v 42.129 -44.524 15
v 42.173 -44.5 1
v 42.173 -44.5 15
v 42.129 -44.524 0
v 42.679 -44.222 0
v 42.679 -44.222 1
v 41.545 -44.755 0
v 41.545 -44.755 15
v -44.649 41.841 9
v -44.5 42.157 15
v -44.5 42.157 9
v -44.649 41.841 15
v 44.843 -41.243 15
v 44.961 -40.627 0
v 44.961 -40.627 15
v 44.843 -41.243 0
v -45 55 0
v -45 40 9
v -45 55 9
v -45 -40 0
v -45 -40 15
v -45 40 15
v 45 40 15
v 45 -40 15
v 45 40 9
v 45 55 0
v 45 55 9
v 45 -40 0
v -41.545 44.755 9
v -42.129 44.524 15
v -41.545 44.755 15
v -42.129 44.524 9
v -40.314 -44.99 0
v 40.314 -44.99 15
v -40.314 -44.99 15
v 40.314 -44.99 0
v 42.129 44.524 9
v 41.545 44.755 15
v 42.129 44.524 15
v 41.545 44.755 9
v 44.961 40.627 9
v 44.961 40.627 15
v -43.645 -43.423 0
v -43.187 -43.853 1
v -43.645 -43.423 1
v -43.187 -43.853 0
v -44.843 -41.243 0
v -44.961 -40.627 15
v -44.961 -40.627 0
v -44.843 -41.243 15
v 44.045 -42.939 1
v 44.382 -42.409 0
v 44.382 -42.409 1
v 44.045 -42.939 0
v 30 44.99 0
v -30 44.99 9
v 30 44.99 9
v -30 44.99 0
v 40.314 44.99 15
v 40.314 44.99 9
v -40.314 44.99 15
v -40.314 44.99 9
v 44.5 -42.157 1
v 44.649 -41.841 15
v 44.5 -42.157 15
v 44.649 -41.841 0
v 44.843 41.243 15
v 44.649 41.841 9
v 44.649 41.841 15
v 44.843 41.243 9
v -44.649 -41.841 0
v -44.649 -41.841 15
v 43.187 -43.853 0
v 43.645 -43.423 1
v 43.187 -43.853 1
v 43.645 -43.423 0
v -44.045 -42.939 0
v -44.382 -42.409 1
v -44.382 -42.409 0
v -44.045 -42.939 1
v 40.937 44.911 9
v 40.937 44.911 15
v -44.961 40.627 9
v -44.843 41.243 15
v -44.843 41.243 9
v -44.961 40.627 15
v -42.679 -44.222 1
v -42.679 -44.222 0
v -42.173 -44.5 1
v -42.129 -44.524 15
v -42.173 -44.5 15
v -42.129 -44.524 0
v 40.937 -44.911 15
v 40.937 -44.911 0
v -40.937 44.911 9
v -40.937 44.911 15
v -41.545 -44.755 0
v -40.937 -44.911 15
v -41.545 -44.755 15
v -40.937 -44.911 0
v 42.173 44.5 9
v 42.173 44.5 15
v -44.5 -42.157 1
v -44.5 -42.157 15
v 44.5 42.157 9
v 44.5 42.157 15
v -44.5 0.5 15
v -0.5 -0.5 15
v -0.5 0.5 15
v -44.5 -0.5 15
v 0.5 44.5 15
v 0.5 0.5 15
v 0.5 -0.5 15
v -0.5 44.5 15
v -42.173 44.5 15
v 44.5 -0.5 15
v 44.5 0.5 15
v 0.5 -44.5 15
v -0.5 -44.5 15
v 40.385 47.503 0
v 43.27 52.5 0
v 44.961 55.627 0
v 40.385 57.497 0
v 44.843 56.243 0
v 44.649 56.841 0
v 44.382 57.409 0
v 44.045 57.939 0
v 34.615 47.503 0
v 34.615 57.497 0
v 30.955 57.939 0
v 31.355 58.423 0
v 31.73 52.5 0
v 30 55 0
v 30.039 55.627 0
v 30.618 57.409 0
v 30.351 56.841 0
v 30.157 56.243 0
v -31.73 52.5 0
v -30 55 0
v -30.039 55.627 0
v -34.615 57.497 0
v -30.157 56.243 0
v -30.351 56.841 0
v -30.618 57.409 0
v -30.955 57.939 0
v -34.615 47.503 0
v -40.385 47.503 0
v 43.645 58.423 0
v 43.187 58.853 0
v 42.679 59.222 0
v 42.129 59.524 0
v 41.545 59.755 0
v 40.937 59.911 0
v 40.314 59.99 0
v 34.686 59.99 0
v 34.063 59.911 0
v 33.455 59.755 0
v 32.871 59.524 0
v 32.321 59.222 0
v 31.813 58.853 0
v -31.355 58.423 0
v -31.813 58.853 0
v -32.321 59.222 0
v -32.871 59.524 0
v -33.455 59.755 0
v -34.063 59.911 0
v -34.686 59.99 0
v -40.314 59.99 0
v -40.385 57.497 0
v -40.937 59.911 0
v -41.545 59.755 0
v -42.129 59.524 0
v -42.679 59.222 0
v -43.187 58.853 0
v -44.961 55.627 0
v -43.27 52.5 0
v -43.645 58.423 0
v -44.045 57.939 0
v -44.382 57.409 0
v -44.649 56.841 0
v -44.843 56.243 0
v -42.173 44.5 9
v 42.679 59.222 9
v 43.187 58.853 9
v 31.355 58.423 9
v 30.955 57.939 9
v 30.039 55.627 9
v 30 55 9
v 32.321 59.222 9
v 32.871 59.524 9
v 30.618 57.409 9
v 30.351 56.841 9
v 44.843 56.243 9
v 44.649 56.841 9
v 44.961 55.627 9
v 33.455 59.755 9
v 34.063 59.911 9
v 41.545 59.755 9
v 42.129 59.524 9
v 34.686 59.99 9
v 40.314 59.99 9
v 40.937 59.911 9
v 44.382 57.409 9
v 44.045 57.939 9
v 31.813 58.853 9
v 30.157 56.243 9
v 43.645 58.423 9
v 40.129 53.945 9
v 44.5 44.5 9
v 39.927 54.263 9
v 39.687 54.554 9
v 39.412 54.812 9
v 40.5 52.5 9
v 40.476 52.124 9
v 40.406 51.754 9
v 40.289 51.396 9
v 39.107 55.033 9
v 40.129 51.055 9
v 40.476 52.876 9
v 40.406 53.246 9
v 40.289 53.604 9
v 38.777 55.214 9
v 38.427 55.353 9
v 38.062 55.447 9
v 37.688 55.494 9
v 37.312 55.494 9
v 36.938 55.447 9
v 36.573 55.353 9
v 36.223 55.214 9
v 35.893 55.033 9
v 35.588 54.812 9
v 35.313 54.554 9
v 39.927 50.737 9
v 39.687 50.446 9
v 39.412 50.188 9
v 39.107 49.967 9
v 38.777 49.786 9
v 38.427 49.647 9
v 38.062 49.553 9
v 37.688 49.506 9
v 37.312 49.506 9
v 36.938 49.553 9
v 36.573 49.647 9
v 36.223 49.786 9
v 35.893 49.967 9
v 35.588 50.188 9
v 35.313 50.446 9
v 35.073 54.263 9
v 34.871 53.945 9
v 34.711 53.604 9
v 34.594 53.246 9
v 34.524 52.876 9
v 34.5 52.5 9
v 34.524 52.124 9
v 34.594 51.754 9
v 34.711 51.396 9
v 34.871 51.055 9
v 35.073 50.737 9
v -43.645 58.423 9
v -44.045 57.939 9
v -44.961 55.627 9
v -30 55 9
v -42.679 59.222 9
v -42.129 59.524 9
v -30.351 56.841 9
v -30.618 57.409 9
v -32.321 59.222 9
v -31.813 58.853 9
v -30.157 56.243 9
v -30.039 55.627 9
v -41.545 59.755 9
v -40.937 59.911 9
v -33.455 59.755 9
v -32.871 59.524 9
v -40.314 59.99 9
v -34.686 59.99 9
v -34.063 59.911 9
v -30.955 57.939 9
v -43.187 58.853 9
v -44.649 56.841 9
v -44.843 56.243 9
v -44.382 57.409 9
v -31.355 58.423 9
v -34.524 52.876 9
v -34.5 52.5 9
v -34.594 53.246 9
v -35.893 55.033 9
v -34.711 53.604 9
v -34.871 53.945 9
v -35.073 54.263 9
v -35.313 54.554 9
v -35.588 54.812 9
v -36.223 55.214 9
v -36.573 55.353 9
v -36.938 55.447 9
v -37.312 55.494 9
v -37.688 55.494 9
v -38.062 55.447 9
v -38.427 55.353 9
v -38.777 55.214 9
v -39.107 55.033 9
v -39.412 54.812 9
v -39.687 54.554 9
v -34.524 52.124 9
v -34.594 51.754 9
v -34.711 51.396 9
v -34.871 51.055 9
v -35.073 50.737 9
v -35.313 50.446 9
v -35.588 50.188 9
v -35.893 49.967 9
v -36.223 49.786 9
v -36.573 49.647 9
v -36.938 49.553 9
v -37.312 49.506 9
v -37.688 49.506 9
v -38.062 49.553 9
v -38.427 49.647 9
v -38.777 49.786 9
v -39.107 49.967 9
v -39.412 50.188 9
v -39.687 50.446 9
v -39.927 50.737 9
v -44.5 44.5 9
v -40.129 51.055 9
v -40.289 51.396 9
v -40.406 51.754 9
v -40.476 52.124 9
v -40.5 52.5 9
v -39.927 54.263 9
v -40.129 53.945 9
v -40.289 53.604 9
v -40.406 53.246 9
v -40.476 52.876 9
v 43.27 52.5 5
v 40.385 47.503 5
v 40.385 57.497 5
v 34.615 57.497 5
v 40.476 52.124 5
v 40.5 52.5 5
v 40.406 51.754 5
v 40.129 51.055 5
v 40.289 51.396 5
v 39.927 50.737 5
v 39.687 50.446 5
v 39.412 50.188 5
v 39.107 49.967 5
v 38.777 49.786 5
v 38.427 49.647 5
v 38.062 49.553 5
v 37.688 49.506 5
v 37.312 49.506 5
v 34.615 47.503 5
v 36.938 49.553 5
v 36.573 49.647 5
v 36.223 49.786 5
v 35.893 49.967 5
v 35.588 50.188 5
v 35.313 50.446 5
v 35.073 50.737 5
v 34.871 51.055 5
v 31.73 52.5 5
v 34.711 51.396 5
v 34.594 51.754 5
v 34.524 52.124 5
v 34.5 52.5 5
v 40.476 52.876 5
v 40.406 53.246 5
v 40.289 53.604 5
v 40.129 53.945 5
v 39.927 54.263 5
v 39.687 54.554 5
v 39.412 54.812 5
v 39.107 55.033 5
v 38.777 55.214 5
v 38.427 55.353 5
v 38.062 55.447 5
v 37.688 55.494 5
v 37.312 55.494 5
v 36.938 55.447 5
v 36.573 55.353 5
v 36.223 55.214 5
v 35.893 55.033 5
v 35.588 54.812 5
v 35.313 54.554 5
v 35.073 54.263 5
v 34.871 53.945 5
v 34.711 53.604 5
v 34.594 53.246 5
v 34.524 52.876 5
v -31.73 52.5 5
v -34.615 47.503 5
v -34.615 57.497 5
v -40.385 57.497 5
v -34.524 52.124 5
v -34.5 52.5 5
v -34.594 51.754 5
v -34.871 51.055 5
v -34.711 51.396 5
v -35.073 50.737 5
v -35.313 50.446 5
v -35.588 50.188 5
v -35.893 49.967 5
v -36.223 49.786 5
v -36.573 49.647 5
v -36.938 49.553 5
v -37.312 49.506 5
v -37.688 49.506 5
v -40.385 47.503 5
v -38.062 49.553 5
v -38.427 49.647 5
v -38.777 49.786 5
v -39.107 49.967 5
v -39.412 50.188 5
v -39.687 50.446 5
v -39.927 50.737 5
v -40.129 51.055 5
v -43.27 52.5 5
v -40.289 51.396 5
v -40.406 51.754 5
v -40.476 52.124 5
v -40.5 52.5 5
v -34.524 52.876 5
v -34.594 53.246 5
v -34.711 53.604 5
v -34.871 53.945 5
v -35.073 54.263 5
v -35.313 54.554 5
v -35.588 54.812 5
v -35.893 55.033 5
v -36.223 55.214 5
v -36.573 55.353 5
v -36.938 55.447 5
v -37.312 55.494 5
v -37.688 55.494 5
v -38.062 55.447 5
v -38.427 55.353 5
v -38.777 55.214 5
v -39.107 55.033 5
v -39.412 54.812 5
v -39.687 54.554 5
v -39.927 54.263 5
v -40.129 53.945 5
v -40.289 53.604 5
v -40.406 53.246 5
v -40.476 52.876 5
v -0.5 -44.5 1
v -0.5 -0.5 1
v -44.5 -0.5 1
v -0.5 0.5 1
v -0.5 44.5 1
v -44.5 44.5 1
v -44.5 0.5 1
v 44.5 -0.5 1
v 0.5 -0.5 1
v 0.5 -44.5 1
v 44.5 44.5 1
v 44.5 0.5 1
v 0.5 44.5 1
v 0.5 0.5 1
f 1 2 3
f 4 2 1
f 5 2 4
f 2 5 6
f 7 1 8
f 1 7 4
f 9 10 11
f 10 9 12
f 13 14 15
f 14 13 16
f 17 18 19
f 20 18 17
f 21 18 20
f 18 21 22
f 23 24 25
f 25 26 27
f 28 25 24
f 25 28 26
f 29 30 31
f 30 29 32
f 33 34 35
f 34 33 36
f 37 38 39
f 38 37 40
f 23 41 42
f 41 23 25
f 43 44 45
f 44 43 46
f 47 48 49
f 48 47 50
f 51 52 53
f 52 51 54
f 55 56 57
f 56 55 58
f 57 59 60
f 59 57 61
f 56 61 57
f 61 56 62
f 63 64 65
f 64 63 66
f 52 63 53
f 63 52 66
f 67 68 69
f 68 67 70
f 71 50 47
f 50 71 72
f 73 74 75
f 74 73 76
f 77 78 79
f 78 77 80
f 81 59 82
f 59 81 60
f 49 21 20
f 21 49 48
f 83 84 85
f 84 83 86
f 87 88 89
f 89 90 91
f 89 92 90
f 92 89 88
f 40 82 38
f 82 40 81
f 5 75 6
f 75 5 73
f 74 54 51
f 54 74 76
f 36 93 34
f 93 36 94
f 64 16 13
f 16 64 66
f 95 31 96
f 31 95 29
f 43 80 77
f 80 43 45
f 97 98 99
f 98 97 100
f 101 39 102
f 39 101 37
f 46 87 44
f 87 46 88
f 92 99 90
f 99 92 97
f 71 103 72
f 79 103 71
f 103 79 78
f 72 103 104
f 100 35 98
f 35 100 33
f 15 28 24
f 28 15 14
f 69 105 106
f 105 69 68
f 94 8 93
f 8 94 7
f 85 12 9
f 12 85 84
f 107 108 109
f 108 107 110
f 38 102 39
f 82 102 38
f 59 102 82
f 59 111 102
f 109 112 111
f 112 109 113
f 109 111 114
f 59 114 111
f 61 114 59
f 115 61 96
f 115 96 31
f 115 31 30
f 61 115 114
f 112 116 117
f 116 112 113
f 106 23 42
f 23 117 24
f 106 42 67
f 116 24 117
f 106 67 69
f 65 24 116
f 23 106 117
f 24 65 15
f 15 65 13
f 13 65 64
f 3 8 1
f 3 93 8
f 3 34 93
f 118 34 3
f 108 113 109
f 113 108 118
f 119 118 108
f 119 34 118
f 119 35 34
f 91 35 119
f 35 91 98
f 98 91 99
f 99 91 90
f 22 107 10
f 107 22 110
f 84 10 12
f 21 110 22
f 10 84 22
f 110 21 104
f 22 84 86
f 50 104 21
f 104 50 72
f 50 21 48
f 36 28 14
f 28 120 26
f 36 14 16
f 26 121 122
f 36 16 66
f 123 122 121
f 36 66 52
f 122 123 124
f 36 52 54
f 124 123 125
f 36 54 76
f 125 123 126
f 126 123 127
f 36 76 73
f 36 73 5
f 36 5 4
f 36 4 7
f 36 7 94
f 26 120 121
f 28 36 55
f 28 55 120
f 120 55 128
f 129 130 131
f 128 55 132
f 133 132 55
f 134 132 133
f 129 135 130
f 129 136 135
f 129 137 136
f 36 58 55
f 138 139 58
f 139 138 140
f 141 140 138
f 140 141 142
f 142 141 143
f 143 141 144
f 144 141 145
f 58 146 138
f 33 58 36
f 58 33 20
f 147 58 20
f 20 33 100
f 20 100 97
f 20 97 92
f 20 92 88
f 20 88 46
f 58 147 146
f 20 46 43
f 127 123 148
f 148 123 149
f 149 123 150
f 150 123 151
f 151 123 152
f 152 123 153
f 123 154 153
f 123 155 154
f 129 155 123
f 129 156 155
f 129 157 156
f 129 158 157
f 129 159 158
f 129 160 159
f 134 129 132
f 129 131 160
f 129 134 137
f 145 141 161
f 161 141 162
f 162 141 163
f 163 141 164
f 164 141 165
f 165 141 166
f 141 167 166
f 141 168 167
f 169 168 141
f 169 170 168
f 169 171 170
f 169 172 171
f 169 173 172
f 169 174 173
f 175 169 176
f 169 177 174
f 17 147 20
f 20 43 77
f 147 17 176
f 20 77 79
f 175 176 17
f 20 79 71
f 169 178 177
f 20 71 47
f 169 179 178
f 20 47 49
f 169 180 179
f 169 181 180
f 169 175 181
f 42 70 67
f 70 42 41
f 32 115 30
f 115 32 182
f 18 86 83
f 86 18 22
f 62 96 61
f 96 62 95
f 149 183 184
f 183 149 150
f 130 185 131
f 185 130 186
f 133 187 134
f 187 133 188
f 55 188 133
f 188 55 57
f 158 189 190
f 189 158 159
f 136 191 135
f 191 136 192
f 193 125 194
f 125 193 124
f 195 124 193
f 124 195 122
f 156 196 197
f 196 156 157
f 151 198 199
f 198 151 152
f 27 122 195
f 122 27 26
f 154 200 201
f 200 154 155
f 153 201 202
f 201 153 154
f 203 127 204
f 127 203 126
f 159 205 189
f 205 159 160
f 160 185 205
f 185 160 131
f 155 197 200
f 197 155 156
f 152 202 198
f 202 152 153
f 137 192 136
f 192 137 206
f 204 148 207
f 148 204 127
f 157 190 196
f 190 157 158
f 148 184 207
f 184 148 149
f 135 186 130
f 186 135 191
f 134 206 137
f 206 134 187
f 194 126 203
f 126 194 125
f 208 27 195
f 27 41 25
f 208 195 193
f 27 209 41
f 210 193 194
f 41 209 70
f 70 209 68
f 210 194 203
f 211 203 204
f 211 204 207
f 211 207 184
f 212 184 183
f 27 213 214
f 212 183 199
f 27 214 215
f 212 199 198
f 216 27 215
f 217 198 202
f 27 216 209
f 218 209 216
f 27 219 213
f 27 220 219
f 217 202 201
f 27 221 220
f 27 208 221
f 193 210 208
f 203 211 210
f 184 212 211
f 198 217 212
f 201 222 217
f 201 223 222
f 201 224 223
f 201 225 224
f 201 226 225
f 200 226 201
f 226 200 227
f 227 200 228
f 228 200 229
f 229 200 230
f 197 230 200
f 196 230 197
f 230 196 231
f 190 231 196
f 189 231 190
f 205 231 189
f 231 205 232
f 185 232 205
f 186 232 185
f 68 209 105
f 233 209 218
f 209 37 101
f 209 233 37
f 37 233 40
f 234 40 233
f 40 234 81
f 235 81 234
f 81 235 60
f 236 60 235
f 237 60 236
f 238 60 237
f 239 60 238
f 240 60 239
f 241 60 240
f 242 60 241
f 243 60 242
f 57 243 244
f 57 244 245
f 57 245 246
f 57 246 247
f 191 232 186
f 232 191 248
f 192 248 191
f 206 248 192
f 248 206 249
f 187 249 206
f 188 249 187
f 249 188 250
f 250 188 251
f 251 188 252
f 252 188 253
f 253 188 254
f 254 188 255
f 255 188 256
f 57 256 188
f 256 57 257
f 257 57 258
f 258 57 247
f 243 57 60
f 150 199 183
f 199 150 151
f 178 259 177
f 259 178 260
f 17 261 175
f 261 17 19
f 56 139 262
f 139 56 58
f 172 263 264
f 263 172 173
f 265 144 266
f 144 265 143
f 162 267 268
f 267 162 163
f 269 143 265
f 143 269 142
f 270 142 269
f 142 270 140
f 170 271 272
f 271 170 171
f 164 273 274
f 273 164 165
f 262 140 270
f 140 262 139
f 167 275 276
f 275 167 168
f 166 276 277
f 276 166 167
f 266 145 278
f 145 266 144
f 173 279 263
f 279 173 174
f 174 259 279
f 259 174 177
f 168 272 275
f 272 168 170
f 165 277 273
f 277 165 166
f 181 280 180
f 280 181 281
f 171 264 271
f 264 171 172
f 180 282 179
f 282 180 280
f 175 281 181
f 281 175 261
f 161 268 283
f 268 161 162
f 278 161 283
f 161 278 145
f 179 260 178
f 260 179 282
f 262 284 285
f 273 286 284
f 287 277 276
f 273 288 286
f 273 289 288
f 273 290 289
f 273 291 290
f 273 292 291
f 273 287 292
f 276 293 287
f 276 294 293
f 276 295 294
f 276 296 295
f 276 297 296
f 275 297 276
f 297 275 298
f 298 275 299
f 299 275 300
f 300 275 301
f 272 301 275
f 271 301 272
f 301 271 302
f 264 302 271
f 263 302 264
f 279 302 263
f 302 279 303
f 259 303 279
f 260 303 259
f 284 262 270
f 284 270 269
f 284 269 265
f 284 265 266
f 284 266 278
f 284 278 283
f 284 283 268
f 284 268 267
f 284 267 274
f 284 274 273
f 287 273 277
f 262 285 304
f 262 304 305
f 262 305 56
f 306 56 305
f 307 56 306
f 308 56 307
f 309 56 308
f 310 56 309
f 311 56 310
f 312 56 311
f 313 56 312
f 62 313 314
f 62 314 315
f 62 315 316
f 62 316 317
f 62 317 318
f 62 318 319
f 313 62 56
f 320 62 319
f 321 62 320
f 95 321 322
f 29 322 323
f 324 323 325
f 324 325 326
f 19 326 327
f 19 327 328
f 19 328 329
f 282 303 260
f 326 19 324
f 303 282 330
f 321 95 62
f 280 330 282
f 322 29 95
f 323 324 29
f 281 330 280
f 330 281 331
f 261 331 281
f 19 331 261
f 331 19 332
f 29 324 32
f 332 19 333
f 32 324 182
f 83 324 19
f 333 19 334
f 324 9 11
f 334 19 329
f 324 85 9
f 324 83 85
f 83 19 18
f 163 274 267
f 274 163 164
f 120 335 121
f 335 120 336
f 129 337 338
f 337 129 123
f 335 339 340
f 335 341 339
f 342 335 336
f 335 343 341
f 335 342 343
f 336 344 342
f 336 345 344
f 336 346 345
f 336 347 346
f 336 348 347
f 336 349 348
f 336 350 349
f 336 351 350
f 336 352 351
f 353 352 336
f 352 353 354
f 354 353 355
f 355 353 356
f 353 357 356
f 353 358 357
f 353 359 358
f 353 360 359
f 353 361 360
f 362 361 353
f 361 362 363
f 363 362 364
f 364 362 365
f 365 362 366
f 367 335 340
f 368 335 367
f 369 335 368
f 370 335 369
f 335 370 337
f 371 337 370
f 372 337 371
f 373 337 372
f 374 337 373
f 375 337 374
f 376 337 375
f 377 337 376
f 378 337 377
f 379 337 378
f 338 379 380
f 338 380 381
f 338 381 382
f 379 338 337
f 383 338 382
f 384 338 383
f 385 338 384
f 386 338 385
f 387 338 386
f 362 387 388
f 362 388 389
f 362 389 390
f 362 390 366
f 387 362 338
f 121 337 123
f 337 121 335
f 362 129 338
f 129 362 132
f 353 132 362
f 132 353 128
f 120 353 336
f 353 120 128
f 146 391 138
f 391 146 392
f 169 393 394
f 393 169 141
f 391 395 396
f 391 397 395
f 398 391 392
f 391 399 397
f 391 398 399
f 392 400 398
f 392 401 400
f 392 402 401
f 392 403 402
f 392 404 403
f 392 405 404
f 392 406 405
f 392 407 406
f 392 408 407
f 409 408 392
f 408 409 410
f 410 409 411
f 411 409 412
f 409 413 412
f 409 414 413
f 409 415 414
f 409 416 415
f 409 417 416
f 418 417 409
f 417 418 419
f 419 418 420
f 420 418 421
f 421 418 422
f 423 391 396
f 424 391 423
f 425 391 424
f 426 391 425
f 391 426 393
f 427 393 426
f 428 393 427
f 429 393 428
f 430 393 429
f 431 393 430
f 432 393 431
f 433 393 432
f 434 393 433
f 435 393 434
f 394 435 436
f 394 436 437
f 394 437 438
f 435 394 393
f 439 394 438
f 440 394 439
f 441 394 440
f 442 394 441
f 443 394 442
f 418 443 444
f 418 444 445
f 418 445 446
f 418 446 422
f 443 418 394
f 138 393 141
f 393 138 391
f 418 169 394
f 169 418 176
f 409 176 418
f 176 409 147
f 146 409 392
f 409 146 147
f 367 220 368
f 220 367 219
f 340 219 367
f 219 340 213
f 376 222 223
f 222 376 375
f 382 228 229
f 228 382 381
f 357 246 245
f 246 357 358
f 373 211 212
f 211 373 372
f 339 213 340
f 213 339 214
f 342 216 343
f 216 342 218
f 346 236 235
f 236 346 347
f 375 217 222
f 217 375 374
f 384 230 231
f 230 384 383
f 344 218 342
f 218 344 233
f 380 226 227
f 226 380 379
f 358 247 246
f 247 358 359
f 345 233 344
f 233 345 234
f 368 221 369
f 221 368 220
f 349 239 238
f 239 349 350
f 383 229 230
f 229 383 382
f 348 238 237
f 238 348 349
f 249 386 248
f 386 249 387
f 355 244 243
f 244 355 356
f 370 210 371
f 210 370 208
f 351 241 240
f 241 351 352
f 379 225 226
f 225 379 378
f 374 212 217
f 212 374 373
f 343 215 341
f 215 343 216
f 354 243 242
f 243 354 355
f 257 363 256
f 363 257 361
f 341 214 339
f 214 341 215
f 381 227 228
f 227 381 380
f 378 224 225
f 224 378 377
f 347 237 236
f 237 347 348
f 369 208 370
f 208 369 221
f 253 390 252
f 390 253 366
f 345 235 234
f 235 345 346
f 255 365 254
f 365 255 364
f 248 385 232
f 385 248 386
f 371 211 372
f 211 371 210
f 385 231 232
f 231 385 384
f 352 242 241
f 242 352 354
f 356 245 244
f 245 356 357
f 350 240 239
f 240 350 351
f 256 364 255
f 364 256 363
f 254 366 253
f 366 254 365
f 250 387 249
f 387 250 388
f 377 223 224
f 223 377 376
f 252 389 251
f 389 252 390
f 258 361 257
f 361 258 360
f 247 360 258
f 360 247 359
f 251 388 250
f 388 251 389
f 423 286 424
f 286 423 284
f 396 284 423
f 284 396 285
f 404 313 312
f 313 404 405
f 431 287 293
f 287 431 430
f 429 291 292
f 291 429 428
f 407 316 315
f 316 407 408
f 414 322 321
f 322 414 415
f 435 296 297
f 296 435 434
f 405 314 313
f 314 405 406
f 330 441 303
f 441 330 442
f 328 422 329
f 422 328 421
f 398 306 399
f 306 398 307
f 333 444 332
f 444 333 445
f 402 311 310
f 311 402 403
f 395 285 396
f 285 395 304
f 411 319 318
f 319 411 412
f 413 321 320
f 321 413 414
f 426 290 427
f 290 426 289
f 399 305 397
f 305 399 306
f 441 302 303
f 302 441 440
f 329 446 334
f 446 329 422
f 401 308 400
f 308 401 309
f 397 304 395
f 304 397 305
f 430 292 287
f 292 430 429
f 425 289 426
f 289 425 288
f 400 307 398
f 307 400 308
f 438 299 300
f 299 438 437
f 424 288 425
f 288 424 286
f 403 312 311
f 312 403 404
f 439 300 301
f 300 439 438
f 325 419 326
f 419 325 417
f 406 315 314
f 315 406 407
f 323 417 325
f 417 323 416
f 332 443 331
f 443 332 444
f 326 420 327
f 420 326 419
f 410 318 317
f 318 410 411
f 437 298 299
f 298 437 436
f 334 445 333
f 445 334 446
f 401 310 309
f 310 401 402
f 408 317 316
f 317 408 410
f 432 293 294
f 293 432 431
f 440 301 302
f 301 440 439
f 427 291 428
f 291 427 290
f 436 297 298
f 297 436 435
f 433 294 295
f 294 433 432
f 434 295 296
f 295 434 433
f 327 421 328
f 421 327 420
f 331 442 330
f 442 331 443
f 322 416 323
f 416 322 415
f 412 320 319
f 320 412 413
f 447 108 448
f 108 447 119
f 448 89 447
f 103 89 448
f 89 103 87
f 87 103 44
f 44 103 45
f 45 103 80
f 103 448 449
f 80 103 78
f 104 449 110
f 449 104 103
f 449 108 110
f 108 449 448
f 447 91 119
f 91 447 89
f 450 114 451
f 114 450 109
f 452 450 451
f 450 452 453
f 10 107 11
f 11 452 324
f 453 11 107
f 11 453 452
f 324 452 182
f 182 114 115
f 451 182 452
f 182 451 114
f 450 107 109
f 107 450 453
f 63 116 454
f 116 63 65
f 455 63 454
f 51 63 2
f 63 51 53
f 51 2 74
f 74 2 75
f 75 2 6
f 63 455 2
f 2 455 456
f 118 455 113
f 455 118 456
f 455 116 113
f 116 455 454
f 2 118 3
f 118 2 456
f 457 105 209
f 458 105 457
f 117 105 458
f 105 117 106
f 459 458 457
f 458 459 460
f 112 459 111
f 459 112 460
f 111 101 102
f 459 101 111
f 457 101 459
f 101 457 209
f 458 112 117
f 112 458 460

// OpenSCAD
$fn = 50;


difference() {
	union() {
		hull() {
			translate(v = [-40.0000000000, 40.0000000000, 0]) {
				cylinder(h = 15, r = 5);
			}
			translate(v = [40.0000000000, 40.0000000000, 0]) {
				cylinder(h = 15, r = 5);
			}
			translate(v = [-40.0000000000, -40.0000000000, 0]) {
				cylinder(h = 15, r = 5);
			}
			translate(v = [40.0000000000, -40.0000000000, 0]) {
				cylinder(h = 15, r = 5);
			}
		}
		translate(v = [37.5000000000, 7.5000000000, 0]) {
			hull() {
				translate(v = [-2.5000000000, 47.5000000000, 0]) {
					cylinder(h = 9, r = 5);
				}
				translate(v = [2.5000000000, 47.5000000000, 0]) {
					cylinder(h = 9, r = 5);
				}
				translate(v = [-2.5000000000, -47.5000000000, 0]) {
					cylinder(h = 9, r = 5);
				}
				translate(v = [2.5000000000, -47.5000000000, 0]) {
					cylinder(h = 9, r = 5);
				}
			}
		}
		translate(v = [-37.5000000000, 7.5000000000, 0]) {
			hull() {
				translate(v = [-2.5000000000, 47.5000000000, 0]) {
					cylinder(h = 9, r = 5);
				}
				translate(v = [2.5000000000, 47.5000000000, 0]) {
					cylinder(h = 9, r = 5);
				}
				translate(v = [-2.5000000000, -47.5000000000, 0]) {
					cylinder(h = 9, r = 5);
				}
				translate(v = [2.5000000000, -47.5000000000, 0]) {
					cylinder(h = 9, r = 5);
				}
			}
		}
	}
	union() {
		translate(v = [37.5000000000, 52.5000000000, 0]) {
			rotate(a = [0, 0, 0]) {
				difference() {
					union() {
						linear_extrude(height = 5) {
							polygon(points = [[5.7700000000, 0.0000000000], [2.8850000000, 4.9969665798], [-2.8850000000, 4.9969665798], [-5.7700000000, 0.0000000000], [-2.8850000000, -4.9969665798], [2.8850000000, -4.9969665798]]);
						}
					}
					union();
				}
			}
		}
		translate(v = [-37.5000000000, 52.5000000000, 0]) {
			rotate(a = [0, 0, 0]) {
				difference() {
					union() {
						linear_extrude(height = 5) {
							polygon(points = [[5.7700000000, 0.0000000000], [2.8850000000, 4.9969665798], [-2.8850000000, 4.9969665798], [-5.7700000000, 0.0000000000], [-2.8850000000, -4.9969665798], [2.8850000000, -4.9969665798]]);
						}
					}
					union();
				}
			}
		}
		translate(v = [37.5000000000, 52.5000000000, -100.0000000000]) {
			cylinder(h = 200, r = 3.0000000000);
		}
		translate(v = [-37.5000000000, 52.5000000000, -100.0000000000]) {
			cylinder(h = 200, r = 3.0000000000);
		}
		#translate(v = [-44.5000000000, -44.5000000000, 1]) {
			cube(size = [44, 44, 30]);
		}
		#translate(v = [-44.5000000000, 0.5000000000, 1]) {
			cube(size = [44, 44, 30]);
		}
		#translate(v = [0.5000000000, -44.5000000000, 1]) {
			cube(size = [44, 44, 30]);
		}
		#translate(v = [0.5000000000, 0.5000000000, 1]) {
			cube(size = [44, 44, 30]);
		}
	}
}
